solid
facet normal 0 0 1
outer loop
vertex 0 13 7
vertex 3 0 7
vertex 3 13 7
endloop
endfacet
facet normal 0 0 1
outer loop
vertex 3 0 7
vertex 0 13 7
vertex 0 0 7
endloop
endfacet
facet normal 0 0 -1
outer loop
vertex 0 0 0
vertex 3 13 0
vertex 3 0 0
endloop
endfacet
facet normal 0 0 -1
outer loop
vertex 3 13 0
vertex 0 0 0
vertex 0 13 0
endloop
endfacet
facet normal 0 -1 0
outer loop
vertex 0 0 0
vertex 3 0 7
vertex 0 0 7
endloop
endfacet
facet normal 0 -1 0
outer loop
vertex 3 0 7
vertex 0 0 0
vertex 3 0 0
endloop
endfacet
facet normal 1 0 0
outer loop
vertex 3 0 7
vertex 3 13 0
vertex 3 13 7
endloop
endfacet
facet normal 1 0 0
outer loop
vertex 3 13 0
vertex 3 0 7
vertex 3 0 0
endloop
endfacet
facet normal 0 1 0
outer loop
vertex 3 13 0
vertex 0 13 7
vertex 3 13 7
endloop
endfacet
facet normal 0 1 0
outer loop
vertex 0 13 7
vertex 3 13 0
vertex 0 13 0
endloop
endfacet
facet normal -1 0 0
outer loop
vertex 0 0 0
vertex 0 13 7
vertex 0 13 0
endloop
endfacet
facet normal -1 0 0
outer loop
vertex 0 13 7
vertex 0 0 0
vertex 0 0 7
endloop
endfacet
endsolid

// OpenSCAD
// Generated by SolidPython 1.0.1 on 2020-07-29 00:46:54


cube(size = [3, 13, 7]);
/***********************************************
*********      SolidPython code:      **********
************************************************
 
# import packages: SolidPython
from solid import *
from solid.utils import *
from itertools import chain, combinations, permutations


class Resize:

    def __init__(self, scad_file):
        self.scad_file = scad_file
        #self.scad_file = import_scad(scad_file)
        # cone/cylinder param:
        self.r1 = 0
        self.r2 = 0
        self.h = 0
        # rectangular prism param:
        self.w = 0
        self.l = 0
        # ellipse param:
        self.r = 0

    # import OpenScad code (file name corresponds to shape)


    # classify shape + parameters
    def assign(self, param1, param2, param3):
        if self.scad_file == 'cone.scad':
            self.r1 = param1
            self.r2 = param2
            self.h = param3
        elif self.scad_file == 'cylinder.scad':
            self.r1 = param1
            self.r2 = param2
            self.h = param3
        elif self.scad_file == 'rectangularPrism.scad':
            self.h = param1
            self.l = param2
            self.w = param3
        else:
            self.r = param1
            self.h = param2

    # resize parameters
    def iterate(self):
        x = range(3, 20, 2)
        i = 1
        if self.scad_file == 'cone.scad':
            tempList = list(permutations(x, 2))
            for temp in tempList:
                param1 = temp[0]
                param2 = temp[1]
                filepath = 'produced_scad_files/' + 'cone' + str(param1) + '_' + str(param2) + '_' + '.scad'
                scad_render_to_file(cylinder(h=param1, r1=param2, r2=0), filepath)

        elif self.scad_file == 'cylinder.scad':
            tempList = list(permutations(x, 3))
            for temp in tempList:
                param1 = temp[0]
                param2 = temp[1]
                filepath = 'produced_scad_files/' + 'cylinder' + str(param1) + '_' + str(param2) + '_' + '.scad'
                scad_render_to_file(cylinder(h=param1, r1=param2, r2=param2), filepath)

        elif self.scad_file == 'rectangularPrism.scad':
            tempList = list(permutations(x, 3))
            for temp in tempList:
                param1 = temp[0]
                param2 = temp[1]
                param3 = temp[2]
                filepath = 'produced_scad_files/' + 'rectangularPrism' + str(param1) + '_' + str(param2) + '_' + str(
                    param3) + '.scad'
                scad_render_to_file(cube(size=(param1, param2, param3)), filepath)

        elif self.scad_file == 'ellipse.scad':
            tempList = list(permutations(x, 4))
            for temp in tempList:
                param1 = temp[0]
                param2 = temp[1]
                param3 = temp[2]
                param4 = temp[3]
                filepath = 'produced_scad_files/' + 'ellipse' + str(param1) + '_' + str(param2) + '_' + str(param3) + '_' + str(param4) + '.scad'
                scad_render_to_file(scale([param1, param2, param3])(sphere(r=param4)), filepath)

    def render_to_scadfile(self):
        scad_render_to_file(scad, 'example.scad') 
 
************************************************/
